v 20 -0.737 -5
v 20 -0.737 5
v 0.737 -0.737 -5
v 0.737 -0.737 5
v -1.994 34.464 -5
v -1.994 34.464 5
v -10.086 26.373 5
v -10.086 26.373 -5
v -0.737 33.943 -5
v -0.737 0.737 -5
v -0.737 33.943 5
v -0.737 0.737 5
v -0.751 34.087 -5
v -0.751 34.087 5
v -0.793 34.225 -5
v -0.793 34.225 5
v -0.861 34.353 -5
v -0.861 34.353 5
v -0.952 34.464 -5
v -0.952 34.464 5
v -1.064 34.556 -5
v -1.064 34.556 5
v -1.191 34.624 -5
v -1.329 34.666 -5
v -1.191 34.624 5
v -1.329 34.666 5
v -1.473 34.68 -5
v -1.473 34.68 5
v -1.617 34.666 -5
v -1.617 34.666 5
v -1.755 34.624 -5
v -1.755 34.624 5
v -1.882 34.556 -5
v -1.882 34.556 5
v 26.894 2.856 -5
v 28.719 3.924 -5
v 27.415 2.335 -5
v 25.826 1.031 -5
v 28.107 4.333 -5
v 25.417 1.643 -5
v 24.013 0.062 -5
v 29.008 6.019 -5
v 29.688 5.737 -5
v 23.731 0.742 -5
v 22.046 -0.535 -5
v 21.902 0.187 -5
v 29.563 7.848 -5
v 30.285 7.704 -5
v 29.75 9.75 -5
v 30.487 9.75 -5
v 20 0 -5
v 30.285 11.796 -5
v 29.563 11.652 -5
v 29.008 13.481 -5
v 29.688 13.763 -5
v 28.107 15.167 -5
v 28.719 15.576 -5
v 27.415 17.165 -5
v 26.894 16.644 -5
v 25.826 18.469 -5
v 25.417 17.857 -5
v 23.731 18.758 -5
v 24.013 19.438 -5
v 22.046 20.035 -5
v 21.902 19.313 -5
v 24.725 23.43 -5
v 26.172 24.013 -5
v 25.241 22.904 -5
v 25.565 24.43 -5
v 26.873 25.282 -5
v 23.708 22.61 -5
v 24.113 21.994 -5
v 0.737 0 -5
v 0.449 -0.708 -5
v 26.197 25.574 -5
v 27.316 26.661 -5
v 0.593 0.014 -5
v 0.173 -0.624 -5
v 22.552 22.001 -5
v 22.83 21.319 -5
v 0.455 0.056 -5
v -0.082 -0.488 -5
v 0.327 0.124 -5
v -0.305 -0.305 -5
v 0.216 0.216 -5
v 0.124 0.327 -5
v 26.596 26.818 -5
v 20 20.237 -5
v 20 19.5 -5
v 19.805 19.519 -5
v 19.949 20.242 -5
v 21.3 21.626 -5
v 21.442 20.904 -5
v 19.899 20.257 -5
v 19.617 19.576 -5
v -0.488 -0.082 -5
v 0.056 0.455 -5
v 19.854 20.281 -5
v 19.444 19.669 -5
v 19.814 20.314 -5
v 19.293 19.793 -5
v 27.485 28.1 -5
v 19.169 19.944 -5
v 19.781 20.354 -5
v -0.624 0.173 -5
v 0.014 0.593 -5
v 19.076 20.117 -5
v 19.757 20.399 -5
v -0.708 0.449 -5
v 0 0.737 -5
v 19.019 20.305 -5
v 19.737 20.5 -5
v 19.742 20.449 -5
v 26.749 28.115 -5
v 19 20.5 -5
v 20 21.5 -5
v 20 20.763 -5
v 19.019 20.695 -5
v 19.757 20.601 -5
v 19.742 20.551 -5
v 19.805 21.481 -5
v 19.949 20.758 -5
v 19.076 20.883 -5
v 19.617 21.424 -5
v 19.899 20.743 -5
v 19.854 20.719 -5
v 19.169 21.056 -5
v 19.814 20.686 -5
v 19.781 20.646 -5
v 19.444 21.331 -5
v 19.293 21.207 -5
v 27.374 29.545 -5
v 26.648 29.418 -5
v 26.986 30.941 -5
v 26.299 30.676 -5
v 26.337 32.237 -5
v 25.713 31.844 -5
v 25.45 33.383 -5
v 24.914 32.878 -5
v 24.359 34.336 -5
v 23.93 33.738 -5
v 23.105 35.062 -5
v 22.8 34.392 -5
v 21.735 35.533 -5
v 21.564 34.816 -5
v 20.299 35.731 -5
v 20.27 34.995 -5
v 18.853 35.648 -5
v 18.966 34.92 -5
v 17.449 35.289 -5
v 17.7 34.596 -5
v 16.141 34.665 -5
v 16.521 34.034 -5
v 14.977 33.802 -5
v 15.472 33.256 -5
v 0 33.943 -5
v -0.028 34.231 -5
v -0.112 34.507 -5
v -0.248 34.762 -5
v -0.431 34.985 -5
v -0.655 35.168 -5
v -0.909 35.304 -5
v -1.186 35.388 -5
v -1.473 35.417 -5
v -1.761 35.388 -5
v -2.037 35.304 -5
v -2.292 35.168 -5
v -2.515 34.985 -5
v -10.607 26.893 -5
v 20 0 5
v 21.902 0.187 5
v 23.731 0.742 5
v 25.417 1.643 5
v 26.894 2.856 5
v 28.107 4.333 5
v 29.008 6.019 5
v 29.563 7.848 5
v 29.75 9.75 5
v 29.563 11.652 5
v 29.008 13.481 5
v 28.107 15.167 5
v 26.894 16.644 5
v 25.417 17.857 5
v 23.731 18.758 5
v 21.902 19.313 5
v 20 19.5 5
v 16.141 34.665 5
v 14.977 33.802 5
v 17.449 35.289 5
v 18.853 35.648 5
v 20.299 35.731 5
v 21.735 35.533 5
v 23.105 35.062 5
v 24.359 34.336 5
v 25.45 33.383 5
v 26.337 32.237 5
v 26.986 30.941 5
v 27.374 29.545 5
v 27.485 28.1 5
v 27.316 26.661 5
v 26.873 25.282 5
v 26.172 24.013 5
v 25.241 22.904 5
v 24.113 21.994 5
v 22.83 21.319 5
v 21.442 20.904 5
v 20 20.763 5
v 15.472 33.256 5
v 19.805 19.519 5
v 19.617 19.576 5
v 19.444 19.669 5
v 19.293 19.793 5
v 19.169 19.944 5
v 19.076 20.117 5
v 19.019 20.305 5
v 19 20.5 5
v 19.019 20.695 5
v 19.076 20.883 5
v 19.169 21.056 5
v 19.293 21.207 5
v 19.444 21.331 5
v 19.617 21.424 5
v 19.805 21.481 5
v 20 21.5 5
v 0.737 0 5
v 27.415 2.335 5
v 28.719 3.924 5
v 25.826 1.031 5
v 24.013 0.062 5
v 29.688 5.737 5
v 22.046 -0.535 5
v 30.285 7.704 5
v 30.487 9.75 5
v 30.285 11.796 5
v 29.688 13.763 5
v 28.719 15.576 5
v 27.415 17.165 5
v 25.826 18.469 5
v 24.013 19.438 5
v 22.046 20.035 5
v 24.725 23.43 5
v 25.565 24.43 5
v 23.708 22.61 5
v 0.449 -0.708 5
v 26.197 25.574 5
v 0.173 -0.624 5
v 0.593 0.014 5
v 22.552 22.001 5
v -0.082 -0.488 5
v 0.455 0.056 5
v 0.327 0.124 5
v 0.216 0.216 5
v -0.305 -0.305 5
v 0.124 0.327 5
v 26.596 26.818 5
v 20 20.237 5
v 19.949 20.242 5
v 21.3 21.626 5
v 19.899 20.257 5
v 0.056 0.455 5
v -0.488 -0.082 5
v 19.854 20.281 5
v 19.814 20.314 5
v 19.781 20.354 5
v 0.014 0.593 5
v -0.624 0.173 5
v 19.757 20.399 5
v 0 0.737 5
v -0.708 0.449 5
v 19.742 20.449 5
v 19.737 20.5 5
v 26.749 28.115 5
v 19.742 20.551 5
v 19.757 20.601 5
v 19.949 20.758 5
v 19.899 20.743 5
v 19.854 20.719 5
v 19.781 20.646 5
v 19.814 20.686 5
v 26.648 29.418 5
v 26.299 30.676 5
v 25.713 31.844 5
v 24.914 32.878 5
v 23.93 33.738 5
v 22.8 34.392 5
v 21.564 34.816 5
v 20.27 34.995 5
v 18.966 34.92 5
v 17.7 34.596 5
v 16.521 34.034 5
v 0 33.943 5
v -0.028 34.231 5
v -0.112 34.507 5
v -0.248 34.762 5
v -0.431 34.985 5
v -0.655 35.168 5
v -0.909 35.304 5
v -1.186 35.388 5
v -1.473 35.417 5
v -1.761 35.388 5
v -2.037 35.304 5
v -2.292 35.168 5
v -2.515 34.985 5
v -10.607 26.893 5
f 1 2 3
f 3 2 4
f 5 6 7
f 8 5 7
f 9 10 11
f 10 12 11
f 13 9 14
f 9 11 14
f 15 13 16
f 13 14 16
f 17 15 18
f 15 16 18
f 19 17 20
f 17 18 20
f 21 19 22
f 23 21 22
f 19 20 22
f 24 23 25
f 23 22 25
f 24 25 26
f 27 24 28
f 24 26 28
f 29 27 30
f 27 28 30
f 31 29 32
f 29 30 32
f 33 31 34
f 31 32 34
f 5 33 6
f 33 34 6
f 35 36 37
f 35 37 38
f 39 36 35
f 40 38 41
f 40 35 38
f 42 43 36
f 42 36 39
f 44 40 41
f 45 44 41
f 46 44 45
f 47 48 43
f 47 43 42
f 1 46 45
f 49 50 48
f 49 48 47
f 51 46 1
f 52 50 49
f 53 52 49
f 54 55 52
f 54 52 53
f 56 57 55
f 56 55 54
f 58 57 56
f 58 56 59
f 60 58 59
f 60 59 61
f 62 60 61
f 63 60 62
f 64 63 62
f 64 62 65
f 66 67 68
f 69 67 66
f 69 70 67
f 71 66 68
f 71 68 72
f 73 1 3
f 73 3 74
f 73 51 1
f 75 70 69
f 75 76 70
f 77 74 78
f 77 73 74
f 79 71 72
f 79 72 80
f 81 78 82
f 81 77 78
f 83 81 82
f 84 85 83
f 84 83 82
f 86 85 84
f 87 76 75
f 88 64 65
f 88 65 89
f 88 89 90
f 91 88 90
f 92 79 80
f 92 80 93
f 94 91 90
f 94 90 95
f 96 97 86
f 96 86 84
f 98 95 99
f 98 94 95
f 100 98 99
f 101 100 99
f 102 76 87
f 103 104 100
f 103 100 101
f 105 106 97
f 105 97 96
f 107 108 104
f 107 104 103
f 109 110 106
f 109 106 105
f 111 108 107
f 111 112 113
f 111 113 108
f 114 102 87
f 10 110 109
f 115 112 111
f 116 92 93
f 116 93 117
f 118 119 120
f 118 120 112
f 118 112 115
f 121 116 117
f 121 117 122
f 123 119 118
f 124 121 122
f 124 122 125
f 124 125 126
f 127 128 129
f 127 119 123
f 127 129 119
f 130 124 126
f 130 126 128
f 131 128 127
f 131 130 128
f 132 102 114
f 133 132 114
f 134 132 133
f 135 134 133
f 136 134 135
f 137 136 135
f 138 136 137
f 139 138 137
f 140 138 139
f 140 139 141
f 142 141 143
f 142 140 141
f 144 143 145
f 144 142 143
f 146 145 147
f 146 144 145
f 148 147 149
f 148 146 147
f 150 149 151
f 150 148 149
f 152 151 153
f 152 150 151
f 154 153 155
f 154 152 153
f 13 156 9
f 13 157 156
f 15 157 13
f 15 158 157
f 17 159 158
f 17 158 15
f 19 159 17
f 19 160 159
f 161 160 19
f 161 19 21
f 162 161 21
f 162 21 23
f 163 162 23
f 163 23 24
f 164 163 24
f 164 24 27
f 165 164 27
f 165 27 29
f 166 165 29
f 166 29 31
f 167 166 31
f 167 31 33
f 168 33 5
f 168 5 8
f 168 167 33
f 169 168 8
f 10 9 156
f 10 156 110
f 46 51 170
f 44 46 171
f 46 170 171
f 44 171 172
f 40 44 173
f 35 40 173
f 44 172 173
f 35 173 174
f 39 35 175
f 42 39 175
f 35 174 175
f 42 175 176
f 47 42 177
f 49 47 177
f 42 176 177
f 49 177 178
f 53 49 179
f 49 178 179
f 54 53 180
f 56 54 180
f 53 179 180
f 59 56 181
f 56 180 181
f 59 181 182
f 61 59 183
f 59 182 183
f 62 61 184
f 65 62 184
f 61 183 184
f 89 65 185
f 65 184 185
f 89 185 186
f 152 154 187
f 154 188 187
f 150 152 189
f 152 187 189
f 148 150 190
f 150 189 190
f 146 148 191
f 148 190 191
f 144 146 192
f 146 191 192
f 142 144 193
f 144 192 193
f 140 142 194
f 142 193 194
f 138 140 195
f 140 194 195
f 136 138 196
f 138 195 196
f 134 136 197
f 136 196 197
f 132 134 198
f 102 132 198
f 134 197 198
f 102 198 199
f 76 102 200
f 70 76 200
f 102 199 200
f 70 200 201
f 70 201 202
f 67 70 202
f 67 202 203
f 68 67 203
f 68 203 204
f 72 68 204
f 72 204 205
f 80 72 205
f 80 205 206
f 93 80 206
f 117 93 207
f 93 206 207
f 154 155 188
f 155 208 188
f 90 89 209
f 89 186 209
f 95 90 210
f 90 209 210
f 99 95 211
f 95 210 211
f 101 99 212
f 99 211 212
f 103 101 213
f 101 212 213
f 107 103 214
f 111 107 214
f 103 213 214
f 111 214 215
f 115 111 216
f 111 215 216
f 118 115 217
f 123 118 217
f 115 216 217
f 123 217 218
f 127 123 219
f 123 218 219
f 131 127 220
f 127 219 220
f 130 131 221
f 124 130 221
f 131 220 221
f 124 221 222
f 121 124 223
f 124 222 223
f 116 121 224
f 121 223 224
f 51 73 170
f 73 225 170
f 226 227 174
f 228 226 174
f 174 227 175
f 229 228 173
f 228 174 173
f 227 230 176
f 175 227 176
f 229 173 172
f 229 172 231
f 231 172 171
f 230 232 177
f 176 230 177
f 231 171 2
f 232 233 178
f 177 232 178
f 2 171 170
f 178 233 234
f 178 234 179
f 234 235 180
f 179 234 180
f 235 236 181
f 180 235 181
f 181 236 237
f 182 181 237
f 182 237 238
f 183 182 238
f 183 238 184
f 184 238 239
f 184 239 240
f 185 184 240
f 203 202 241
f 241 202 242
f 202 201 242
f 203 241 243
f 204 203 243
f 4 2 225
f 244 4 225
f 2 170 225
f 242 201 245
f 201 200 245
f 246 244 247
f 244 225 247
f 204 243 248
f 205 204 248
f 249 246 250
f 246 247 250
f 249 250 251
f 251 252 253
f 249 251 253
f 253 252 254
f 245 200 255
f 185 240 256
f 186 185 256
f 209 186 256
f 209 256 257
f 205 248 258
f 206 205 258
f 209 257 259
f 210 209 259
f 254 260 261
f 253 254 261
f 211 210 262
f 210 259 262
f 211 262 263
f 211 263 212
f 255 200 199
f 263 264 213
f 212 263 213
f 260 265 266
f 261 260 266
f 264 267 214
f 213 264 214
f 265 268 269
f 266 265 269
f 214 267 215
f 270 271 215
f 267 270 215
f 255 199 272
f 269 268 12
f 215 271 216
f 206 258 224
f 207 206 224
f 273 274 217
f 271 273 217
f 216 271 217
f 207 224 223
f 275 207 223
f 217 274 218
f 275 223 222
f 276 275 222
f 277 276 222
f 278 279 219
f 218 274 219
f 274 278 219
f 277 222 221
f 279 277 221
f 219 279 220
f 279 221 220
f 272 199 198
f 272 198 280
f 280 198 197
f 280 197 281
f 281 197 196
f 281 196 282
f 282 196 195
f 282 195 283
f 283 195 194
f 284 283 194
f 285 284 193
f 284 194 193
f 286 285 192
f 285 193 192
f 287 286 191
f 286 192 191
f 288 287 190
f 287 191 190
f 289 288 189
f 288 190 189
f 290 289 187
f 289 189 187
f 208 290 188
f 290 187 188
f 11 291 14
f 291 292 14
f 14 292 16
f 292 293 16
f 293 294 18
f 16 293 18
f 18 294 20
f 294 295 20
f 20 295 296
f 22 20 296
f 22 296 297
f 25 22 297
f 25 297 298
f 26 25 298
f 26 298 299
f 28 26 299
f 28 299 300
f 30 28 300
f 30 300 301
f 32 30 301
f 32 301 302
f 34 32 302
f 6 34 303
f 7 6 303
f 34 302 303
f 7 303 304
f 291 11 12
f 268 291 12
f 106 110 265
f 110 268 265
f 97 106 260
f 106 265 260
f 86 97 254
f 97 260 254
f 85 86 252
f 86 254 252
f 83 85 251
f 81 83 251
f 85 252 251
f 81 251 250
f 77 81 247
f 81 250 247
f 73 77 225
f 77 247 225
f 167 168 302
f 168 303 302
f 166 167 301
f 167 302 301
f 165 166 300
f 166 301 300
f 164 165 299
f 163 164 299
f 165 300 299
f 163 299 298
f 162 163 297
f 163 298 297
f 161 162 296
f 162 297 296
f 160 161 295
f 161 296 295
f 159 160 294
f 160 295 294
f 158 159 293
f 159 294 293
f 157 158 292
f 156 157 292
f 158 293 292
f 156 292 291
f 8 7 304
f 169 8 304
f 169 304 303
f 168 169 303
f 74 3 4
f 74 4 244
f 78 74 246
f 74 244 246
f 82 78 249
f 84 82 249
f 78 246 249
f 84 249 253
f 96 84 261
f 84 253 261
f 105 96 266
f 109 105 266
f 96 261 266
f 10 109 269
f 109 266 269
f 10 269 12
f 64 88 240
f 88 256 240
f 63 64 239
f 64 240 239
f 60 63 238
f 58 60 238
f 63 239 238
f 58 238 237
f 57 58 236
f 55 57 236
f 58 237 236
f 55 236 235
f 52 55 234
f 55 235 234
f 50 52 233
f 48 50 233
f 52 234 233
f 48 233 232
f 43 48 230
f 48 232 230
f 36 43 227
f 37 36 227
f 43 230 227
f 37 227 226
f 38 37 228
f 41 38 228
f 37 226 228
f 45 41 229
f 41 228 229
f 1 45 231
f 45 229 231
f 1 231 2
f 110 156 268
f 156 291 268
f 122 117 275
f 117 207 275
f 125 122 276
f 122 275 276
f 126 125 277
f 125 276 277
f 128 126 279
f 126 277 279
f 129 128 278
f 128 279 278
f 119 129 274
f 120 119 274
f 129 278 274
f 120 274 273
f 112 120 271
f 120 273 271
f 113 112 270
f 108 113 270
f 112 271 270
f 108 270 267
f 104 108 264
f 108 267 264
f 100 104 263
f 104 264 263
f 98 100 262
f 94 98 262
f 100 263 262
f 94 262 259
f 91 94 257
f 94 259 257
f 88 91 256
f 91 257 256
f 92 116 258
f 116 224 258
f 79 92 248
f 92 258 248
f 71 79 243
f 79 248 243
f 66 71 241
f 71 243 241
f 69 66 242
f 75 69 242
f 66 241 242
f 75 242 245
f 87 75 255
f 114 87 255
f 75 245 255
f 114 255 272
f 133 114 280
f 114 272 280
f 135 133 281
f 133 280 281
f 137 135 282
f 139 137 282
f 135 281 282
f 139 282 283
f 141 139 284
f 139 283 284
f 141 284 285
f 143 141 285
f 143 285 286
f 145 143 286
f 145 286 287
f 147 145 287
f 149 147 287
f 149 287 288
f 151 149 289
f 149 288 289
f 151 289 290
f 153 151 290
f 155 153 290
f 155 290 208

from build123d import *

# Parameters (mm, degrees)
BASE_FLANGE1_DEPTH = 5


# Sheet-metal steps are written as plain solids
with BuildPart() as part:
    # Sketch1 → Base-Flange1 (new, symmetric)
    with BuildSketch(Plane.XY):
        with BuildLine():
            Line((-10.606601718, 26.893398282), (-2.51490971, 34.98509029))
            ThreePointArc((-2.51490971, 34.98509029), (-0.909430767, 35.304439907), (0, 33.94338058))
            Line((0, 33.94338058), (0, 0.7366))
            ThreePointArc((0, 0.7366), (0.215745145, 0.215745145), (0.7366, 0))
            Line((0.7366, 0), (20, 0))
            ThreePointArc((20, 0), (29.75, 9.75), (20, 19.5))
            ThreePointArc((20, 19.5), (19, 20.5), (20, 21.5))
            ThreePointArc((20, 21.5), (26.298801772, 30.676436942), (15.471512501, 33.255527043))
            Line((15.471512501, 33.255527043), (14.97733711, 33.801759816))
            ThreePointArc((14.97733711, 33.801759816), (26.986164348, 30.94122412), (20, 20.7634))
            ThreePointArc((20, 20.7634), (19.7366, 20.5), (20, 20.2366))
            ThreePointArc((20, 20.2366), (30.4866, 9.75), (20, -0.7366))
            Line((20, -0.7366), (0.7366, -0.7366))
            ThreePointArc((0.7366, -0.7366), (-0.30510971, -0.30510971), (-0.7366, 0.7366))
            Line((-0.7366, 0.7366), (-0.7366, 33.94338058))
            ThreePointArc((-0.7366, 33.94338058), (-1.191315384, 34.623910244), (-1.994054855, 34.464235435))
            Line((-1.994054855, 34.464235435), (-10.085746863, 26.372543427))
            Line((-10.085746863, 26.372543427), (-10.606601718, 26.893398282))
        make_face()
    extrude(amount=BASE_FLANGE1_DEPTH, both=True)


solid = part.part
